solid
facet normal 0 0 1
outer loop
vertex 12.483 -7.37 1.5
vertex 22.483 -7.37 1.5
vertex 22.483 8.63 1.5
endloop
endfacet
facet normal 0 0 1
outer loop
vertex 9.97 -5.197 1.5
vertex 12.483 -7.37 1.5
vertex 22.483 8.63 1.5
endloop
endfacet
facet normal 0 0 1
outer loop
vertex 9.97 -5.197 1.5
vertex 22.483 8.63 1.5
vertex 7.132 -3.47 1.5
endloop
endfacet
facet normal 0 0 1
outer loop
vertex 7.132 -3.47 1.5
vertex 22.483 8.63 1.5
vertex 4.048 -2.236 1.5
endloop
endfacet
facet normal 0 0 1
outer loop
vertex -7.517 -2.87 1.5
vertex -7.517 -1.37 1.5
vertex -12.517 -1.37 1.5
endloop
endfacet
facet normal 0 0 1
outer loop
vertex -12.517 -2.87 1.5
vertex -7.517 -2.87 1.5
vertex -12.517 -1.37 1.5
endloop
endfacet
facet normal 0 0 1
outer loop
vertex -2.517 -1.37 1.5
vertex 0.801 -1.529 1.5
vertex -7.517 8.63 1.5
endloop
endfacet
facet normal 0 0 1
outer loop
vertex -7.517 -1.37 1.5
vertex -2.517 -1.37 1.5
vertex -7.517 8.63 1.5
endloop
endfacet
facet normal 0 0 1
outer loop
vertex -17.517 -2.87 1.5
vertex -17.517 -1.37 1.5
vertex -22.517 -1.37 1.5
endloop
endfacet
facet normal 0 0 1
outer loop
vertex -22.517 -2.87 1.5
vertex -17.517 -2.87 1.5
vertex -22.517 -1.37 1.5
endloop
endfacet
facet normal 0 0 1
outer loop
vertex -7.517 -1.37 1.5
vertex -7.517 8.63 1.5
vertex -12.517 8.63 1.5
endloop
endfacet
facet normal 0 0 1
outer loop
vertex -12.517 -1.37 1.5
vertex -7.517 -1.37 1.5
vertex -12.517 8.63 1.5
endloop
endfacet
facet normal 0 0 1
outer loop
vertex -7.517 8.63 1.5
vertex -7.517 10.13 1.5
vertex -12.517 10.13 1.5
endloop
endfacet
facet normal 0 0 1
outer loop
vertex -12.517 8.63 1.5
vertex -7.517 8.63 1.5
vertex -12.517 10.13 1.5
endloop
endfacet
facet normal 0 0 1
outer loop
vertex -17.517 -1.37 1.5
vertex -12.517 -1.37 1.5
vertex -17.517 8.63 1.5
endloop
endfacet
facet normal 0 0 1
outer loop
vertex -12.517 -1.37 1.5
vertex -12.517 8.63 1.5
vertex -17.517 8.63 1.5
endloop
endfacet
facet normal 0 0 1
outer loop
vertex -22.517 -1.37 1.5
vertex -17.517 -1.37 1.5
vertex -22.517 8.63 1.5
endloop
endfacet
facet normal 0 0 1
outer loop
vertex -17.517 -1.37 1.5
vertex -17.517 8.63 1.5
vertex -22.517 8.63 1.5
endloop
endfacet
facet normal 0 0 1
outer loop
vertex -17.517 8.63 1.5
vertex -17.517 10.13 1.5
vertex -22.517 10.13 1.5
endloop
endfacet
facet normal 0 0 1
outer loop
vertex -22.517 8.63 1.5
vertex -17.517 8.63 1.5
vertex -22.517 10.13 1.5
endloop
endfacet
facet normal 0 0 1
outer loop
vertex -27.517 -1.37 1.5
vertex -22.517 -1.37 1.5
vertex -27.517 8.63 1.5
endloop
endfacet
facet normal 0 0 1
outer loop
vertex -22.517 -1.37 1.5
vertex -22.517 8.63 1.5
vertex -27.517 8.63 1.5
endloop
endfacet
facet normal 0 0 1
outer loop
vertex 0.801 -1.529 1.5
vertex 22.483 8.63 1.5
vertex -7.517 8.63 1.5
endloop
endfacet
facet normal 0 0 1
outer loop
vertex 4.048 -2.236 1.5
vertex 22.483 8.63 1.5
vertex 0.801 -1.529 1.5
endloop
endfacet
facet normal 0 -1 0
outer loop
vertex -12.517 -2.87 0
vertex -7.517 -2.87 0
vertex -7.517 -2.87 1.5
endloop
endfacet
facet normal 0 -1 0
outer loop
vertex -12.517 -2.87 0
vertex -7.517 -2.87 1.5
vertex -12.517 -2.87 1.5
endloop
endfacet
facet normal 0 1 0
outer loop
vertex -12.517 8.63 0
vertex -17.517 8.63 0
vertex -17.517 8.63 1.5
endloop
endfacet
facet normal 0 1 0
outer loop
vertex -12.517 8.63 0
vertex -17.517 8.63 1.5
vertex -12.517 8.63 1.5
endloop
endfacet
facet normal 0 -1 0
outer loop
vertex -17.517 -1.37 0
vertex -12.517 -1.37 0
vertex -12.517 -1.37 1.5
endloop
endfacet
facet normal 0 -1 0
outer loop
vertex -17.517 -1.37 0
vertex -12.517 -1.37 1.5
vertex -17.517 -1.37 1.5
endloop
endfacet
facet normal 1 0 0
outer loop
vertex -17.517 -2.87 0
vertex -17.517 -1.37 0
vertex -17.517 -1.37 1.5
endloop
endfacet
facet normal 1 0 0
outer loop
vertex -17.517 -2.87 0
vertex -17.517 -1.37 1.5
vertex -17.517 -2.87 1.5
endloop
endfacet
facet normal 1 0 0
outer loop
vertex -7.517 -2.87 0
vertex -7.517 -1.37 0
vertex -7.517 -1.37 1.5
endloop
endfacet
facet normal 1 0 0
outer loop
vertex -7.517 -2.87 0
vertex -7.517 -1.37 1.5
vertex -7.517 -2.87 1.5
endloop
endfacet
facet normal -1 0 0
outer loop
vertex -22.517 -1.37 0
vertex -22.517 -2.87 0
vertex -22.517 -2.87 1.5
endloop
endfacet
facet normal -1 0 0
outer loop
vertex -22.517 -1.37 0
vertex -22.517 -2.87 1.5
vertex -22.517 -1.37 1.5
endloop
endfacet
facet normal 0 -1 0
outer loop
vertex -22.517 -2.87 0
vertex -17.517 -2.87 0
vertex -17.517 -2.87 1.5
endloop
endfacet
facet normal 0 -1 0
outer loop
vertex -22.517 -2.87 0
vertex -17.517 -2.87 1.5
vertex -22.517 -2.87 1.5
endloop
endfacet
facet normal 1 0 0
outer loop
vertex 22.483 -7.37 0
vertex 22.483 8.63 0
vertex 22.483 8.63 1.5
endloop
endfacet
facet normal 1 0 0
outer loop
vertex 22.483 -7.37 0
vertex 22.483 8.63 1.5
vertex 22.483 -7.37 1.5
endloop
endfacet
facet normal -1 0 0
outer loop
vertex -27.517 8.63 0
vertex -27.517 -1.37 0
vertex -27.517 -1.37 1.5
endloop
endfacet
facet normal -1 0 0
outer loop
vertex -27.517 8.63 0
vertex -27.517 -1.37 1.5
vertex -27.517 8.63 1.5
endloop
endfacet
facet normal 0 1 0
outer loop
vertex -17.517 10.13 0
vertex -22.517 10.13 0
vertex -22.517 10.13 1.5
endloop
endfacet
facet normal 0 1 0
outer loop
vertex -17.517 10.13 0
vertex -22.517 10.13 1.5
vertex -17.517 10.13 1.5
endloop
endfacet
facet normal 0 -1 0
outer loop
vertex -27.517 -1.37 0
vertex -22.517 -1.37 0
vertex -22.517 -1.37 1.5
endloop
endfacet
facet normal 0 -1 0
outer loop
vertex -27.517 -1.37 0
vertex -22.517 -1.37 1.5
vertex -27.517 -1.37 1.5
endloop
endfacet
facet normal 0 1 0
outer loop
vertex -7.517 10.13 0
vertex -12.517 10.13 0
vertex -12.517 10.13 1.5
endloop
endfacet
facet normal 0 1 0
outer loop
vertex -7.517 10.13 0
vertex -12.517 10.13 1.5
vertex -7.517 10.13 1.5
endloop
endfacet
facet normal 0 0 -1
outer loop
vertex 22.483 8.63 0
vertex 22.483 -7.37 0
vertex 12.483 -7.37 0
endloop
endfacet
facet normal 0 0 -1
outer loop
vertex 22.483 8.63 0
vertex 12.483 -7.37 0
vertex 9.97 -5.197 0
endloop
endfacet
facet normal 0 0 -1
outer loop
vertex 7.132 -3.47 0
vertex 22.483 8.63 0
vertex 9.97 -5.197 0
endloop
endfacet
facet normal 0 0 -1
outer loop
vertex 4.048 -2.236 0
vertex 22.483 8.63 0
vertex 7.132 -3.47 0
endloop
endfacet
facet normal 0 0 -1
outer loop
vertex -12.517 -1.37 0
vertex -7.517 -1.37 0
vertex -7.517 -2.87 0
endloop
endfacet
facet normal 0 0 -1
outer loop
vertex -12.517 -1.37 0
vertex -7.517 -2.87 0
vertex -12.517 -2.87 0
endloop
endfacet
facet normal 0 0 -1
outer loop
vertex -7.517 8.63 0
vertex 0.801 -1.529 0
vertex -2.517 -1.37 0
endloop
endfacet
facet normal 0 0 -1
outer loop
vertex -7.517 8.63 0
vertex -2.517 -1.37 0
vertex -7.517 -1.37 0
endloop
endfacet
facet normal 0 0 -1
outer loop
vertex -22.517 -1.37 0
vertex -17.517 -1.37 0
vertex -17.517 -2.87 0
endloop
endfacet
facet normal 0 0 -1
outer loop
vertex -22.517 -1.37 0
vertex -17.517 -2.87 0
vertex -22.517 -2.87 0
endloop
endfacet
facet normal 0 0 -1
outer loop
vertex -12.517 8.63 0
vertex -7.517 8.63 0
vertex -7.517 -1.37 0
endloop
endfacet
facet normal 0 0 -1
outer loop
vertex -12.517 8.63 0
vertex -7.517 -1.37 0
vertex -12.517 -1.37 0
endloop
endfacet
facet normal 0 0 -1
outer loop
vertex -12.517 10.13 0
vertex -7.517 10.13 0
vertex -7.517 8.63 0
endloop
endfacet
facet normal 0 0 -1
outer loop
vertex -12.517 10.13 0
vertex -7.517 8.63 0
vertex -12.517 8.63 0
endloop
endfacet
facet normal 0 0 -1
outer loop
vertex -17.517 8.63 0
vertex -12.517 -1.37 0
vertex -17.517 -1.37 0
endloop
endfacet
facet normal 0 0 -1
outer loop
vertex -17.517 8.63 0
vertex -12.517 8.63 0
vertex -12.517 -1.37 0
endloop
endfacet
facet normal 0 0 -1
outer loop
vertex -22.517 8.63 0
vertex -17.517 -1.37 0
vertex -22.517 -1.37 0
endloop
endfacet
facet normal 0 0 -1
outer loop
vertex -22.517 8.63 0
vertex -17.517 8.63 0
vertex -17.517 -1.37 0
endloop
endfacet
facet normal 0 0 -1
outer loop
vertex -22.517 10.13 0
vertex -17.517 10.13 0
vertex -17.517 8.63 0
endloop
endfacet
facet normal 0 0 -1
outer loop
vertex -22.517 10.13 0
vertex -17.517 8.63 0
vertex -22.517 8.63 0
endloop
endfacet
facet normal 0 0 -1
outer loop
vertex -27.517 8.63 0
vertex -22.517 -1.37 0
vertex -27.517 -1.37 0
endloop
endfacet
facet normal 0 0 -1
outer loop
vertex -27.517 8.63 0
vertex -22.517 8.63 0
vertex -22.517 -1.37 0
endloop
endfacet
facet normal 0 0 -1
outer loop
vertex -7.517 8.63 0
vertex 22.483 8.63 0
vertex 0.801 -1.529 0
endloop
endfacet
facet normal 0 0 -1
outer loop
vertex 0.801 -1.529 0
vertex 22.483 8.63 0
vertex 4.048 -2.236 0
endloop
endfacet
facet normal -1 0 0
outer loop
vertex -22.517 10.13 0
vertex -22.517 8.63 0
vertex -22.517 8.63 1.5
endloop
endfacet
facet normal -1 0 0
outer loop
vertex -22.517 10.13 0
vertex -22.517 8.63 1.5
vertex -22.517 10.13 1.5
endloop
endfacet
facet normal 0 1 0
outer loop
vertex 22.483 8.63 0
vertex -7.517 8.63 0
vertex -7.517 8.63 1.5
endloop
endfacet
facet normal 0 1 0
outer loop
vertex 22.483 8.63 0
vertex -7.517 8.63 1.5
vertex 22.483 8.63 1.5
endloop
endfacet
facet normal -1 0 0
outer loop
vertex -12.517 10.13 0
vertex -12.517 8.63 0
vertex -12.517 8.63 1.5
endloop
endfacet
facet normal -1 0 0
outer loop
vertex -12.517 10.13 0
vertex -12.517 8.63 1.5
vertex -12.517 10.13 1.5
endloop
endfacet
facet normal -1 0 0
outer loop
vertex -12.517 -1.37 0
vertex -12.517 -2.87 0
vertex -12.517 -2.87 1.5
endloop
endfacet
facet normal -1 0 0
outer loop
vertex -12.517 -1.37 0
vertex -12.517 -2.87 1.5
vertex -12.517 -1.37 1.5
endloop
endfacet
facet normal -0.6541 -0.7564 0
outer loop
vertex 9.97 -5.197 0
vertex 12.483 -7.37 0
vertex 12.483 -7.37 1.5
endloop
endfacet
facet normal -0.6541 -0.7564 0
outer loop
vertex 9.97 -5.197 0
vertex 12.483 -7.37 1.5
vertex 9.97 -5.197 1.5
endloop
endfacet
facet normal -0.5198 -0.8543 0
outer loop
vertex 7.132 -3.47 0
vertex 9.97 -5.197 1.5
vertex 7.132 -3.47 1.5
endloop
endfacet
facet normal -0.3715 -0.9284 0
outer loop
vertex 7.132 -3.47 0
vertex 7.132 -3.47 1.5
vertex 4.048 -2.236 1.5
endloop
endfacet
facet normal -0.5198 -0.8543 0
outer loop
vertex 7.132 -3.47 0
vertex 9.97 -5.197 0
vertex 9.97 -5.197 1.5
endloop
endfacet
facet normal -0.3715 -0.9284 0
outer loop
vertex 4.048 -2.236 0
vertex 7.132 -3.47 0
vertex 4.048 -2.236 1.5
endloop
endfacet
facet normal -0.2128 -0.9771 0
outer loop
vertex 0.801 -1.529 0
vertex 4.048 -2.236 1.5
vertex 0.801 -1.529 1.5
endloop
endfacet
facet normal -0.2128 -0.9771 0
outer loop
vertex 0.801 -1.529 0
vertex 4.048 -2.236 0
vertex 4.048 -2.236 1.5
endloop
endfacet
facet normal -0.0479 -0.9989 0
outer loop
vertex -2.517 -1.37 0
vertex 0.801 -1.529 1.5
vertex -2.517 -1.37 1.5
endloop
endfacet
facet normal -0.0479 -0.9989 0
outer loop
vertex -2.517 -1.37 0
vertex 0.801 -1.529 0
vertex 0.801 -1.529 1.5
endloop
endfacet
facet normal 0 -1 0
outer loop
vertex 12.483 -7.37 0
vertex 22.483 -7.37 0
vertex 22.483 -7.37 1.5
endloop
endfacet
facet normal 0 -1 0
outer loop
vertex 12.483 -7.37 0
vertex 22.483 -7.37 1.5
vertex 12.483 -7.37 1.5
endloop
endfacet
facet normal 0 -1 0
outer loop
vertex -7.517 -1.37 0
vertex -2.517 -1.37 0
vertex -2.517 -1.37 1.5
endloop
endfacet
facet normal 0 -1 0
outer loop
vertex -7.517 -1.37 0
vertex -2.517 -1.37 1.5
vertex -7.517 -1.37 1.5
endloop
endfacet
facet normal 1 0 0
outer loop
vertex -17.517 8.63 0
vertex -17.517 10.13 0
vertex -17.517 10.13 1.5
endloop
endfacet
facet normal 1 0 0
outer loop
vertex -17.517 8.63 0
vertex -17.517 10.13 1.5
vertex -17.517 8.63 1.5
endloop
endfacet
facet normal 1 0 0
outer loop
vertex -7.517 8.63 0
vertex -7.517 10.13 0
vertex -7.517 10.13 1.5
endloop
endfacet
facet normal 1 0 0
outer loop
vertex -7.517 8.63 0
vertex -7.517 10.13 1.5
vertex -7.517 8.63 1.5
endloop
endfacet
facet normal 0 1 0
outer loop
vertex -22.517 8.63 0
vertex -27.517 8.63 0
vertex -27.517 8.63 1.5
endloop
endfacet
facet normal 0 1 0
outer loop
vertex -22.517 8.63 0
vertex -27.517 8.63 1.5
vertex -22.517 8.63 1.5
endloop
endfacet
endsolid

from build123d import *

# Parameters (mm, degrees)
BOSS_EXTRUDE1_DEPTH = 1.5


with BuildPart() as part:
    # Sketch2 → Boss-Extrude1 (new body)
    with BuildSketch(Plane.XY):
        with BuildLine():
            Line((-27.517156851, -1.370401199), (-27.517156851, 8.629598801))
            Line((-27.517156851, 8.629598801), (-22.517156851, 8.629598801))
            Line((-22.517156851, 8.629598801), (-22.517156851, 10.129598801))
            Line((-22.517156851, 10.129598801), (-17.517156851, 10.129598801))
            Line((-17.517156851, 10.129598801), (-17.517156851, 8.629598801))
            Line((-17.517156851, 8.629598801), (-12.517156851, 8.629598801))
            Line((-12.517156851, 8.629598801), (-12.517156851, 10.129598801))
            Line((-12.517156851, 10.129598801), (-7.517156851, 10.129598801))
            Line((-7.517156851, 10.129598801), (-7.517156851, 8.629598801))
            Line((-7.517156851, 8.629598801), (22.482843149, 8.629598801))
            Line((22.482843149, 8.629598801), (22.482843149, -7.370401199))
            Line((22.482843149, -7.370401199), (12.482843149, -7.370401199))
            ThreePointArc((12.482843149, -7.370401199), (5.615628068, -2.788438903), (-2.517156851, -1.370401199))
            Line((-2.517156851, -1.370401199), (-7.517156851, -1.370401199))
            Line((-7.517156851, -1.370401199), (-7.517156851, -2.870401199))
            Line((-7.517156851, -2.870401199), (-12.517156851, -2.870401199))
            Line((-12.517156851, -2.870401199), (-12.517156851, -1.370401199))
            Line((-12.517156851, -1.370401199), (-17.517156851, -1.370401199))
            Line((-17.517156851, -1.370401199), (-17.517156851, -2.870401199))
            Line((-17.517156851, -2.870401199), (-22.517156851, -2.870401199))
            Line((-22.517156851, -2.870401199), (-22.517156851, -1.370401199))
            Line((-22.517156851, -1.370401199), (-27.517156851, -1.370401199))
        make_face()
    extrude(amount=BOSS_EXTRUDE1_DEPTH)


solid = part.part
